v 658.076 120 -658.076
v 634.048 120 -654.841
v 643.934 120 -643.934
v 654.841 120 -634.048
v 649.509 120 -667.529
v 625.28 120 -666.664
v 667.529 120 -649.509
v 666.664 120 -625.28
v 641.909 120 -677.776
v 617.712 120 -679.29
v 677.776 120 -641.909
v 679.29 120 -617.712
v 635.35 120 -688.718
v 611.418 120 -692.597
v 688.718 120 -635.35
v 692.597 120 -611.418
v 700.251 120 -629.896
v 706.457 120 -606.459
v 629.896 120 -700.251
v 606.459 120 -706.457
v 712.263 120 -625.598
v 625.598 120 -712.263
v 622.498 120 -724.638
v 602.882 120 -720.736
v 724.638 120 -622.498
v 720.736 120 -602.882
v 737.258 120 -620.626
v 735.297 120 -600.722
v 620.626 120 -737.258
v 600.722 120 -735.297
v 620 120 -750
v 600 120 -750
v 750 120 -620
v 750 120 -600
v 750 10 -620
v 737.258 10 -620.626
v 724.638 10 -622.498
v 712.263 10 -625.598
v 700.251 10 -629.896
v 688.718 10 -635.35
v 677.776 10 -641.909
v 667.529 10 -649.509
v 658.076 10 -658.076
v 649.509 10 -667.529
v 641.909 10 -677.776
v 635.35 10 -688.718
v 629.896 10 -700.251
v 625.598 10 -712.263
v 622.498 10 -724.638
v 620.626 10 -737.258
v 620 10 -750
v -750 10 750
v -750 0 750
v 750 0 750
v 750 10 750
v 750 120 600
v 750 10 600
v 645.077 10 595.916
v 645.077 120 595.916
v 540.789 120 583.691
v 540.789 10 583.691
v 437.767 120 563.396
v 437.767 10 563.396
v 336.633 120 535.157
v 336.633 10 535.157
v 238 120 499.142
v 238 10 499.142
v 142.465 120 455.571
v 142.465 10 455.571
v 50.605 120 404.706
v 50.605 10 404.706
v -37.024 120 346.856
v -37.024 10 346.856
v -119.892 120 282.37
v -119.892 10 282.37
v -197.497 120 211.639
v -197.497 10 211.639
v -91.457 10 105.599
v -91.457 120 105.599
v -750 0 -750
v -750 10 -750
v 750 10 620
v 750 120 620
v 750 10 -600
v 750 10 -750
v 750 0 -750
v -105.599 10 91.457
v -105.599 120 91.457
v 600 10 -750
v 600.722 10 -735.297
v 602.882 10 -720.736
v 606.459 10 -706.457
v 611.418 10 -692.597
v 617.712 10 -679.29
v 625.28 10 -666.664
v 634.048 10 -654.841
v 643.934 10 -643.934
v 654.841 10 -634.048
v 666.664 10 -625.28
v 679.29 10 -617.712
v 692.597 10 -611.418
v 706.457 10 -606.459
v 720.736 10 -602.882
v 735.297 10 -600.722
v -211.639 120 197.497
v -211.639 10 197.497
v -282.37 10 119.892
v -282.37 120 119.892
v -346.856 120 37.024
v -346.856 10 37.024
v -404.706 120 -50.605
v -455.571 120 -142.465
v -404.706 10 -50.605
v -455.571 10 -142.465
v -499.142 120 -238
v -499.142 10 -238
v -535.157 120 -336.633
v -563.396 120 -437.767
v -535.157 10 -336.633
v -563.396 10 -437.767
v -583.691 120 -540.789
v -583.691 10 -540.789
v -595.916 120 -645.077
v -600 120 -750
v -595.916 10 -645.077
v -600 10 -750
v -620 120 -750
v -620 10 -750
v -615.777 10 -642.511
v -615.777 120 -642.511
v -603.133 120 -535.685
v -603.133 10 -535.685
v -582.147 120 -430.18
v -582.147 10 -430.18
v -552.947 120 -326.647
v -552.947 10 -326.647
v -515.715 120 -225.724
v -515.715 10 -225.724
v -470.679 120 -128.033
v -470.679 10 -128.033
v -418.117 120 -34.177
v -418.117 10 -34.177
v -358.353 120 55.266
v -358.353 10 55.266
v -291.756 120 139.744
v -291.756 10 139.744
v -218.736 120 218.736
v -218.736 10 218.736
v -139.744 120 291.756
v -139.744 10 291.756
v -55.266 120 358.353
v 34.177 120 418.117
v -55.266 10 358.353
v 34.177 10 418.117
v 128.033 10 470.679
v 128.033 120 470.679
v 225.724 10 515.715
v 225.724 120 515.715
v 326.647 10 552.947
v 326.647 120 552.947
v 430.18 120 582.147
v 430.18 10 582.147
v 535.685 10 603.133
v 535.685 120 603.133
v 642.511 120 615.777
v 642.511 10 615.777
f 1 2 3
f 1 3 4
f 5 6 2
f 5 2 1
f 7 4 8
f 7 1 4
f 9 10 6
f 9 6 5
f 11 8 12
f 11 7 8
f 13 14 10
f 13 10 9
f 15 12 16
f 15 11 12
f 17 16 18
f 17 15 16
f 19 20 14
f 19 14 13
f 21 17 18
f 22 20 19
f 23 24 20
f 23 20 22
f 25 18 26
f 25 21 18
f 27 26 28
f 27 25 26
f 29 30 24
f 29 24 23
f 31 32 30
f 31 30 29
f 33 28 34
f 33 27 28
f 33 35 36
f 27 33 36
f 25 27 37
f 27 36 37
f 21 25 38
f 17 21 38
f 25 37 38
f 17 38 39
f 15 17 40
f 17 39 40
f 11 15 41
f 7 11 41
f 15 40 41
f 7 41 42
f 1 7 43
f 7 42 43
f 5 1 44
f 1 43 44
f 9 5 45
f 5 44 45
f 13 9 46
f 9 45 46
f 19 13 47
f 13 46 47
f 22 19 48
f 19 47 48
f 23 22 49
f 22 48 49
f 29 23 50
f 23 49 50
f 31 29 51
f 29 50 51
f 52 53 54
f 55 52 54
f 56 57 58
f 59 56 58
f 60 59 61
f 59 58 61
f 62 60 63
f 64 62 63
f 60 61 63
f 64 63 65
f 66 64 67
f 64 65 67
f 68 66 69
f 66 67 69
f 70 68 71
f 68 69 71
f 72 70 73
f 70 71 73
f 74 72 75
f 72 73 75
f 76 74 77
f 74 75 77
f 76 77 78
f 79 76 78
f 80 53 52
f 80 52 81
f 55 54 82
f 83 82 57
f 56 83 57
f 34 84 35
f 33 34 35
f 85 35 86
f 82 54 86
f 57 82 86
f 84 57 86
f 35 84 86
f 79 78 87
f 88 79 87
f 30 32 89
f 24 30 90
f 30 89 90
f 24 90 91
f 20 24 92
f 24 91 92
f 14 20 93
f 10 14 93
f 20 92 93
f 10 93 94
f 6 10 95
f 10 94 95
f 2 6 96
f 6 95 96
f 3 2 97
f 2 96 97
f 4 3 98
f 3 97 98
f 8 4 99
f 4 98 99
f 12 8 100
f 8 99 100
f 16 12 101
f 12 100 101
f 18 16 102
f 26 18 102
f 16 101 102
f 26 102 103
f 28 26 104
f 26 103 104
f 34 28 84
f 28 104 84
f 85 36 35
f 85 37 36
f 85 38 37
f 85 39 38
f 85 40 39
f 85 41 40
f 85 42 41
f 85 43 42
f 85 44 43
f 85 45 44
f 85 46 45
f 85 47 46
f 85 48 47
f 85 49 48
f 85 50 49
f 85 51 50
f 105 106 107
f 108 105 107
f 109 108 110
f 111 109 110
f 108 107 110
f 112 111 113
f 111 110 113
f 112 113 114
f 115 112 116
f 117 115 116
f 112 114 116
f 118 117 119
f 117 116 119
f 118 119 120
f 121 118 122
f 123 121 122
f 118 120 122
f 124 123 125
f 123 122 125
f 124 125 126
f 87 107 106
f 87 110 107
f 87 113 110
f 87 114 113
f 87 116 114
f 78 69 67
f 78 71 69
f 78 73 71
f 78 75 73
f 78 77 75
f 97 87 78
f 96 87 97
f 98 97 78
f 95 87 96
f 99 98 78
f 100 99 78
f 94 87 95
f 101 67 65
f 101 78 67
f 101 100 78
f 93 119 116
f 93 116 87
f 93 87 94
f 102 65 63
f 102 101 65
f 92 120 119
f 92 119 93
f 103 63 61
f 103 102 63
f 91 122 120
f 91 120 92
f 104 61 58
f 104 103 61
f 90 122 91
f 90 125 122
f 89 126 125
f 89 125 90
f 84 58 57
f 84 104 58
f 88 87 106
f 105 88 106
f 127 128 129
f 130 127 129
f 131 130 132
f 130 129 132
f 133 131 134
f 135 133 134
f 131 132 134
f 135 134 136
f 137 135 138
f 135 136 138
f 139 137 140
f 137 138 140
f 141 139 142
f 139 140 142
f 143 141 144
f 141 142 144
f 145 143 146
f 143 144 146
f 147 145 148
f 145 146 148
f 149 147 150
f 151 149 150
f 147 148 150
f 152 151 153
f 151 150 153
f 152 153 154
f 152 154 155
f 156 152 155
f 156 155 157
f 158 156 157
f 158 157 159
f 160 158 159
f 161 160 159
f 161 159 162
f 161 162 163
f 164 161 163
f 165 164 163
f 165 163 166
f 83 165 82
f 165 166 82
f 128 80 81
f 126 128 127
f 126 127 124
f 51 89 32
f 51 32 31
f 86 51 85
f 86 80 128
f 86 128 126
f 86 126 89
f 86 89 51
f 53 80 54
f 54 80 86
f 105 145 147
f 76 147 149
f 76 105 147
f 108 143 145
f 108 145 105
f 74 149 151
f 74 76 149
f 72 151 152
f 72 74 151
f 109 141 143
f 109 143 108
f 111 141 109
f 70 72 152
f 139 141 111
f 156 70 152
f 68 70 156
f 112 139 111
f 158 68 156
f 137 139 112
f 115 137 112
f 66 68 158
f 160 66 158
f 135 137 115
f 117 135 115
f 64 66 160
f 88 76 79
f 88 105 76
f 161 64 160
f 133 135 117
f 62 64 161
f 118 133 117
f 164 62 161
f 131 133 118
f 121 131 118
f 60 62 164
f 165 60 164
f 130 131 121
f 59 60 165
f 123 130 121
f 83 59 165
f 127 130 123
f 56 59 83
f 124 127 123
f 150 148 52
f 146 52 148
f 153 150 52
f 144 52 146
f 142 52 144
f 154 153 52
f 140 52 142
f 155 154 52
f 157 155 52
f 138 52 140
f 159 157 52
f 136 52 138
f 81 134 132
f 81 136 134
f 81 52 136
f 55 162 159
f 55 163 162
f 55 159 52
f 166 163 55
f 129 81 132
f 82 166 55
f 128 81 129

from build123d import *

# Parameters (mm, degrees)
SKETCH2_W           = 1500
SKETCH2_H           = 1500
BOSS_EXTRUDE1_DEPTH = 10
BOSS_EXTRUDE2_DEPTH = 110
BOSS_EXTRUDE3_DEPTH = 110


with BuildPart() as part:
    # Sketch2 → Boss-Extrude1 (new body)
    with BuildSketch(Plane(origin=(0, 0, 0), x_dir=(1, 0, 0), z_dir=(0, 1, 0))):
        Rectangle(SKETCH2_W, SKETCH2_H)
    extrude(amount=BOSS_EXTRUDE1_DEPTH)

    # Sketch3 → Boss-Extrude2 (add)
    with BuildSketch(Plane(origin=(0, 10, 0), x_dir=(1, 0, 0), z_dir=(0, 1, 0))):
        with BuildLine():
            ThreePointArc((750, -600), (-204.594154602, -204.594154602), (-600, 750))
            Line((-600, 750), (-620, 750))
            ThreePointArc((-620, 750), (-218.736290226, -218.736290226), (750, -620))
            Line((750, -620), (750, -600))
        make_face()
        with BuildLine():
            Line((620, 750), (600, 750))
            ThreePointArc((600, 750), (643.933982822, 643.933982822), (750, 600))
            Line((750, 600), (750, 620))
            ThreePointArc((750, 620), (658.076118446, 658.076118446), (620, 750))
        make_face()
    extrude(amount=BOSS_EXTRUDE2_DEPTH)

    # Sketch4 → Boss-Extrude3 (add)
    with BuildSketch(Plane(origin=(0, 10, 0), x_dir=(1, 0, 0), z_dir=(0, 1, 0))):
        Polygon((-197.52308679, -211.665222414), (-91.457069612, -105.599205236), (-105.599205236, -91.457069612), (-211.665222414, -197.52308679), align=None)
    extrude(amount=BOSS_EXTRUDE3_DEPTH)


solid = part.part
